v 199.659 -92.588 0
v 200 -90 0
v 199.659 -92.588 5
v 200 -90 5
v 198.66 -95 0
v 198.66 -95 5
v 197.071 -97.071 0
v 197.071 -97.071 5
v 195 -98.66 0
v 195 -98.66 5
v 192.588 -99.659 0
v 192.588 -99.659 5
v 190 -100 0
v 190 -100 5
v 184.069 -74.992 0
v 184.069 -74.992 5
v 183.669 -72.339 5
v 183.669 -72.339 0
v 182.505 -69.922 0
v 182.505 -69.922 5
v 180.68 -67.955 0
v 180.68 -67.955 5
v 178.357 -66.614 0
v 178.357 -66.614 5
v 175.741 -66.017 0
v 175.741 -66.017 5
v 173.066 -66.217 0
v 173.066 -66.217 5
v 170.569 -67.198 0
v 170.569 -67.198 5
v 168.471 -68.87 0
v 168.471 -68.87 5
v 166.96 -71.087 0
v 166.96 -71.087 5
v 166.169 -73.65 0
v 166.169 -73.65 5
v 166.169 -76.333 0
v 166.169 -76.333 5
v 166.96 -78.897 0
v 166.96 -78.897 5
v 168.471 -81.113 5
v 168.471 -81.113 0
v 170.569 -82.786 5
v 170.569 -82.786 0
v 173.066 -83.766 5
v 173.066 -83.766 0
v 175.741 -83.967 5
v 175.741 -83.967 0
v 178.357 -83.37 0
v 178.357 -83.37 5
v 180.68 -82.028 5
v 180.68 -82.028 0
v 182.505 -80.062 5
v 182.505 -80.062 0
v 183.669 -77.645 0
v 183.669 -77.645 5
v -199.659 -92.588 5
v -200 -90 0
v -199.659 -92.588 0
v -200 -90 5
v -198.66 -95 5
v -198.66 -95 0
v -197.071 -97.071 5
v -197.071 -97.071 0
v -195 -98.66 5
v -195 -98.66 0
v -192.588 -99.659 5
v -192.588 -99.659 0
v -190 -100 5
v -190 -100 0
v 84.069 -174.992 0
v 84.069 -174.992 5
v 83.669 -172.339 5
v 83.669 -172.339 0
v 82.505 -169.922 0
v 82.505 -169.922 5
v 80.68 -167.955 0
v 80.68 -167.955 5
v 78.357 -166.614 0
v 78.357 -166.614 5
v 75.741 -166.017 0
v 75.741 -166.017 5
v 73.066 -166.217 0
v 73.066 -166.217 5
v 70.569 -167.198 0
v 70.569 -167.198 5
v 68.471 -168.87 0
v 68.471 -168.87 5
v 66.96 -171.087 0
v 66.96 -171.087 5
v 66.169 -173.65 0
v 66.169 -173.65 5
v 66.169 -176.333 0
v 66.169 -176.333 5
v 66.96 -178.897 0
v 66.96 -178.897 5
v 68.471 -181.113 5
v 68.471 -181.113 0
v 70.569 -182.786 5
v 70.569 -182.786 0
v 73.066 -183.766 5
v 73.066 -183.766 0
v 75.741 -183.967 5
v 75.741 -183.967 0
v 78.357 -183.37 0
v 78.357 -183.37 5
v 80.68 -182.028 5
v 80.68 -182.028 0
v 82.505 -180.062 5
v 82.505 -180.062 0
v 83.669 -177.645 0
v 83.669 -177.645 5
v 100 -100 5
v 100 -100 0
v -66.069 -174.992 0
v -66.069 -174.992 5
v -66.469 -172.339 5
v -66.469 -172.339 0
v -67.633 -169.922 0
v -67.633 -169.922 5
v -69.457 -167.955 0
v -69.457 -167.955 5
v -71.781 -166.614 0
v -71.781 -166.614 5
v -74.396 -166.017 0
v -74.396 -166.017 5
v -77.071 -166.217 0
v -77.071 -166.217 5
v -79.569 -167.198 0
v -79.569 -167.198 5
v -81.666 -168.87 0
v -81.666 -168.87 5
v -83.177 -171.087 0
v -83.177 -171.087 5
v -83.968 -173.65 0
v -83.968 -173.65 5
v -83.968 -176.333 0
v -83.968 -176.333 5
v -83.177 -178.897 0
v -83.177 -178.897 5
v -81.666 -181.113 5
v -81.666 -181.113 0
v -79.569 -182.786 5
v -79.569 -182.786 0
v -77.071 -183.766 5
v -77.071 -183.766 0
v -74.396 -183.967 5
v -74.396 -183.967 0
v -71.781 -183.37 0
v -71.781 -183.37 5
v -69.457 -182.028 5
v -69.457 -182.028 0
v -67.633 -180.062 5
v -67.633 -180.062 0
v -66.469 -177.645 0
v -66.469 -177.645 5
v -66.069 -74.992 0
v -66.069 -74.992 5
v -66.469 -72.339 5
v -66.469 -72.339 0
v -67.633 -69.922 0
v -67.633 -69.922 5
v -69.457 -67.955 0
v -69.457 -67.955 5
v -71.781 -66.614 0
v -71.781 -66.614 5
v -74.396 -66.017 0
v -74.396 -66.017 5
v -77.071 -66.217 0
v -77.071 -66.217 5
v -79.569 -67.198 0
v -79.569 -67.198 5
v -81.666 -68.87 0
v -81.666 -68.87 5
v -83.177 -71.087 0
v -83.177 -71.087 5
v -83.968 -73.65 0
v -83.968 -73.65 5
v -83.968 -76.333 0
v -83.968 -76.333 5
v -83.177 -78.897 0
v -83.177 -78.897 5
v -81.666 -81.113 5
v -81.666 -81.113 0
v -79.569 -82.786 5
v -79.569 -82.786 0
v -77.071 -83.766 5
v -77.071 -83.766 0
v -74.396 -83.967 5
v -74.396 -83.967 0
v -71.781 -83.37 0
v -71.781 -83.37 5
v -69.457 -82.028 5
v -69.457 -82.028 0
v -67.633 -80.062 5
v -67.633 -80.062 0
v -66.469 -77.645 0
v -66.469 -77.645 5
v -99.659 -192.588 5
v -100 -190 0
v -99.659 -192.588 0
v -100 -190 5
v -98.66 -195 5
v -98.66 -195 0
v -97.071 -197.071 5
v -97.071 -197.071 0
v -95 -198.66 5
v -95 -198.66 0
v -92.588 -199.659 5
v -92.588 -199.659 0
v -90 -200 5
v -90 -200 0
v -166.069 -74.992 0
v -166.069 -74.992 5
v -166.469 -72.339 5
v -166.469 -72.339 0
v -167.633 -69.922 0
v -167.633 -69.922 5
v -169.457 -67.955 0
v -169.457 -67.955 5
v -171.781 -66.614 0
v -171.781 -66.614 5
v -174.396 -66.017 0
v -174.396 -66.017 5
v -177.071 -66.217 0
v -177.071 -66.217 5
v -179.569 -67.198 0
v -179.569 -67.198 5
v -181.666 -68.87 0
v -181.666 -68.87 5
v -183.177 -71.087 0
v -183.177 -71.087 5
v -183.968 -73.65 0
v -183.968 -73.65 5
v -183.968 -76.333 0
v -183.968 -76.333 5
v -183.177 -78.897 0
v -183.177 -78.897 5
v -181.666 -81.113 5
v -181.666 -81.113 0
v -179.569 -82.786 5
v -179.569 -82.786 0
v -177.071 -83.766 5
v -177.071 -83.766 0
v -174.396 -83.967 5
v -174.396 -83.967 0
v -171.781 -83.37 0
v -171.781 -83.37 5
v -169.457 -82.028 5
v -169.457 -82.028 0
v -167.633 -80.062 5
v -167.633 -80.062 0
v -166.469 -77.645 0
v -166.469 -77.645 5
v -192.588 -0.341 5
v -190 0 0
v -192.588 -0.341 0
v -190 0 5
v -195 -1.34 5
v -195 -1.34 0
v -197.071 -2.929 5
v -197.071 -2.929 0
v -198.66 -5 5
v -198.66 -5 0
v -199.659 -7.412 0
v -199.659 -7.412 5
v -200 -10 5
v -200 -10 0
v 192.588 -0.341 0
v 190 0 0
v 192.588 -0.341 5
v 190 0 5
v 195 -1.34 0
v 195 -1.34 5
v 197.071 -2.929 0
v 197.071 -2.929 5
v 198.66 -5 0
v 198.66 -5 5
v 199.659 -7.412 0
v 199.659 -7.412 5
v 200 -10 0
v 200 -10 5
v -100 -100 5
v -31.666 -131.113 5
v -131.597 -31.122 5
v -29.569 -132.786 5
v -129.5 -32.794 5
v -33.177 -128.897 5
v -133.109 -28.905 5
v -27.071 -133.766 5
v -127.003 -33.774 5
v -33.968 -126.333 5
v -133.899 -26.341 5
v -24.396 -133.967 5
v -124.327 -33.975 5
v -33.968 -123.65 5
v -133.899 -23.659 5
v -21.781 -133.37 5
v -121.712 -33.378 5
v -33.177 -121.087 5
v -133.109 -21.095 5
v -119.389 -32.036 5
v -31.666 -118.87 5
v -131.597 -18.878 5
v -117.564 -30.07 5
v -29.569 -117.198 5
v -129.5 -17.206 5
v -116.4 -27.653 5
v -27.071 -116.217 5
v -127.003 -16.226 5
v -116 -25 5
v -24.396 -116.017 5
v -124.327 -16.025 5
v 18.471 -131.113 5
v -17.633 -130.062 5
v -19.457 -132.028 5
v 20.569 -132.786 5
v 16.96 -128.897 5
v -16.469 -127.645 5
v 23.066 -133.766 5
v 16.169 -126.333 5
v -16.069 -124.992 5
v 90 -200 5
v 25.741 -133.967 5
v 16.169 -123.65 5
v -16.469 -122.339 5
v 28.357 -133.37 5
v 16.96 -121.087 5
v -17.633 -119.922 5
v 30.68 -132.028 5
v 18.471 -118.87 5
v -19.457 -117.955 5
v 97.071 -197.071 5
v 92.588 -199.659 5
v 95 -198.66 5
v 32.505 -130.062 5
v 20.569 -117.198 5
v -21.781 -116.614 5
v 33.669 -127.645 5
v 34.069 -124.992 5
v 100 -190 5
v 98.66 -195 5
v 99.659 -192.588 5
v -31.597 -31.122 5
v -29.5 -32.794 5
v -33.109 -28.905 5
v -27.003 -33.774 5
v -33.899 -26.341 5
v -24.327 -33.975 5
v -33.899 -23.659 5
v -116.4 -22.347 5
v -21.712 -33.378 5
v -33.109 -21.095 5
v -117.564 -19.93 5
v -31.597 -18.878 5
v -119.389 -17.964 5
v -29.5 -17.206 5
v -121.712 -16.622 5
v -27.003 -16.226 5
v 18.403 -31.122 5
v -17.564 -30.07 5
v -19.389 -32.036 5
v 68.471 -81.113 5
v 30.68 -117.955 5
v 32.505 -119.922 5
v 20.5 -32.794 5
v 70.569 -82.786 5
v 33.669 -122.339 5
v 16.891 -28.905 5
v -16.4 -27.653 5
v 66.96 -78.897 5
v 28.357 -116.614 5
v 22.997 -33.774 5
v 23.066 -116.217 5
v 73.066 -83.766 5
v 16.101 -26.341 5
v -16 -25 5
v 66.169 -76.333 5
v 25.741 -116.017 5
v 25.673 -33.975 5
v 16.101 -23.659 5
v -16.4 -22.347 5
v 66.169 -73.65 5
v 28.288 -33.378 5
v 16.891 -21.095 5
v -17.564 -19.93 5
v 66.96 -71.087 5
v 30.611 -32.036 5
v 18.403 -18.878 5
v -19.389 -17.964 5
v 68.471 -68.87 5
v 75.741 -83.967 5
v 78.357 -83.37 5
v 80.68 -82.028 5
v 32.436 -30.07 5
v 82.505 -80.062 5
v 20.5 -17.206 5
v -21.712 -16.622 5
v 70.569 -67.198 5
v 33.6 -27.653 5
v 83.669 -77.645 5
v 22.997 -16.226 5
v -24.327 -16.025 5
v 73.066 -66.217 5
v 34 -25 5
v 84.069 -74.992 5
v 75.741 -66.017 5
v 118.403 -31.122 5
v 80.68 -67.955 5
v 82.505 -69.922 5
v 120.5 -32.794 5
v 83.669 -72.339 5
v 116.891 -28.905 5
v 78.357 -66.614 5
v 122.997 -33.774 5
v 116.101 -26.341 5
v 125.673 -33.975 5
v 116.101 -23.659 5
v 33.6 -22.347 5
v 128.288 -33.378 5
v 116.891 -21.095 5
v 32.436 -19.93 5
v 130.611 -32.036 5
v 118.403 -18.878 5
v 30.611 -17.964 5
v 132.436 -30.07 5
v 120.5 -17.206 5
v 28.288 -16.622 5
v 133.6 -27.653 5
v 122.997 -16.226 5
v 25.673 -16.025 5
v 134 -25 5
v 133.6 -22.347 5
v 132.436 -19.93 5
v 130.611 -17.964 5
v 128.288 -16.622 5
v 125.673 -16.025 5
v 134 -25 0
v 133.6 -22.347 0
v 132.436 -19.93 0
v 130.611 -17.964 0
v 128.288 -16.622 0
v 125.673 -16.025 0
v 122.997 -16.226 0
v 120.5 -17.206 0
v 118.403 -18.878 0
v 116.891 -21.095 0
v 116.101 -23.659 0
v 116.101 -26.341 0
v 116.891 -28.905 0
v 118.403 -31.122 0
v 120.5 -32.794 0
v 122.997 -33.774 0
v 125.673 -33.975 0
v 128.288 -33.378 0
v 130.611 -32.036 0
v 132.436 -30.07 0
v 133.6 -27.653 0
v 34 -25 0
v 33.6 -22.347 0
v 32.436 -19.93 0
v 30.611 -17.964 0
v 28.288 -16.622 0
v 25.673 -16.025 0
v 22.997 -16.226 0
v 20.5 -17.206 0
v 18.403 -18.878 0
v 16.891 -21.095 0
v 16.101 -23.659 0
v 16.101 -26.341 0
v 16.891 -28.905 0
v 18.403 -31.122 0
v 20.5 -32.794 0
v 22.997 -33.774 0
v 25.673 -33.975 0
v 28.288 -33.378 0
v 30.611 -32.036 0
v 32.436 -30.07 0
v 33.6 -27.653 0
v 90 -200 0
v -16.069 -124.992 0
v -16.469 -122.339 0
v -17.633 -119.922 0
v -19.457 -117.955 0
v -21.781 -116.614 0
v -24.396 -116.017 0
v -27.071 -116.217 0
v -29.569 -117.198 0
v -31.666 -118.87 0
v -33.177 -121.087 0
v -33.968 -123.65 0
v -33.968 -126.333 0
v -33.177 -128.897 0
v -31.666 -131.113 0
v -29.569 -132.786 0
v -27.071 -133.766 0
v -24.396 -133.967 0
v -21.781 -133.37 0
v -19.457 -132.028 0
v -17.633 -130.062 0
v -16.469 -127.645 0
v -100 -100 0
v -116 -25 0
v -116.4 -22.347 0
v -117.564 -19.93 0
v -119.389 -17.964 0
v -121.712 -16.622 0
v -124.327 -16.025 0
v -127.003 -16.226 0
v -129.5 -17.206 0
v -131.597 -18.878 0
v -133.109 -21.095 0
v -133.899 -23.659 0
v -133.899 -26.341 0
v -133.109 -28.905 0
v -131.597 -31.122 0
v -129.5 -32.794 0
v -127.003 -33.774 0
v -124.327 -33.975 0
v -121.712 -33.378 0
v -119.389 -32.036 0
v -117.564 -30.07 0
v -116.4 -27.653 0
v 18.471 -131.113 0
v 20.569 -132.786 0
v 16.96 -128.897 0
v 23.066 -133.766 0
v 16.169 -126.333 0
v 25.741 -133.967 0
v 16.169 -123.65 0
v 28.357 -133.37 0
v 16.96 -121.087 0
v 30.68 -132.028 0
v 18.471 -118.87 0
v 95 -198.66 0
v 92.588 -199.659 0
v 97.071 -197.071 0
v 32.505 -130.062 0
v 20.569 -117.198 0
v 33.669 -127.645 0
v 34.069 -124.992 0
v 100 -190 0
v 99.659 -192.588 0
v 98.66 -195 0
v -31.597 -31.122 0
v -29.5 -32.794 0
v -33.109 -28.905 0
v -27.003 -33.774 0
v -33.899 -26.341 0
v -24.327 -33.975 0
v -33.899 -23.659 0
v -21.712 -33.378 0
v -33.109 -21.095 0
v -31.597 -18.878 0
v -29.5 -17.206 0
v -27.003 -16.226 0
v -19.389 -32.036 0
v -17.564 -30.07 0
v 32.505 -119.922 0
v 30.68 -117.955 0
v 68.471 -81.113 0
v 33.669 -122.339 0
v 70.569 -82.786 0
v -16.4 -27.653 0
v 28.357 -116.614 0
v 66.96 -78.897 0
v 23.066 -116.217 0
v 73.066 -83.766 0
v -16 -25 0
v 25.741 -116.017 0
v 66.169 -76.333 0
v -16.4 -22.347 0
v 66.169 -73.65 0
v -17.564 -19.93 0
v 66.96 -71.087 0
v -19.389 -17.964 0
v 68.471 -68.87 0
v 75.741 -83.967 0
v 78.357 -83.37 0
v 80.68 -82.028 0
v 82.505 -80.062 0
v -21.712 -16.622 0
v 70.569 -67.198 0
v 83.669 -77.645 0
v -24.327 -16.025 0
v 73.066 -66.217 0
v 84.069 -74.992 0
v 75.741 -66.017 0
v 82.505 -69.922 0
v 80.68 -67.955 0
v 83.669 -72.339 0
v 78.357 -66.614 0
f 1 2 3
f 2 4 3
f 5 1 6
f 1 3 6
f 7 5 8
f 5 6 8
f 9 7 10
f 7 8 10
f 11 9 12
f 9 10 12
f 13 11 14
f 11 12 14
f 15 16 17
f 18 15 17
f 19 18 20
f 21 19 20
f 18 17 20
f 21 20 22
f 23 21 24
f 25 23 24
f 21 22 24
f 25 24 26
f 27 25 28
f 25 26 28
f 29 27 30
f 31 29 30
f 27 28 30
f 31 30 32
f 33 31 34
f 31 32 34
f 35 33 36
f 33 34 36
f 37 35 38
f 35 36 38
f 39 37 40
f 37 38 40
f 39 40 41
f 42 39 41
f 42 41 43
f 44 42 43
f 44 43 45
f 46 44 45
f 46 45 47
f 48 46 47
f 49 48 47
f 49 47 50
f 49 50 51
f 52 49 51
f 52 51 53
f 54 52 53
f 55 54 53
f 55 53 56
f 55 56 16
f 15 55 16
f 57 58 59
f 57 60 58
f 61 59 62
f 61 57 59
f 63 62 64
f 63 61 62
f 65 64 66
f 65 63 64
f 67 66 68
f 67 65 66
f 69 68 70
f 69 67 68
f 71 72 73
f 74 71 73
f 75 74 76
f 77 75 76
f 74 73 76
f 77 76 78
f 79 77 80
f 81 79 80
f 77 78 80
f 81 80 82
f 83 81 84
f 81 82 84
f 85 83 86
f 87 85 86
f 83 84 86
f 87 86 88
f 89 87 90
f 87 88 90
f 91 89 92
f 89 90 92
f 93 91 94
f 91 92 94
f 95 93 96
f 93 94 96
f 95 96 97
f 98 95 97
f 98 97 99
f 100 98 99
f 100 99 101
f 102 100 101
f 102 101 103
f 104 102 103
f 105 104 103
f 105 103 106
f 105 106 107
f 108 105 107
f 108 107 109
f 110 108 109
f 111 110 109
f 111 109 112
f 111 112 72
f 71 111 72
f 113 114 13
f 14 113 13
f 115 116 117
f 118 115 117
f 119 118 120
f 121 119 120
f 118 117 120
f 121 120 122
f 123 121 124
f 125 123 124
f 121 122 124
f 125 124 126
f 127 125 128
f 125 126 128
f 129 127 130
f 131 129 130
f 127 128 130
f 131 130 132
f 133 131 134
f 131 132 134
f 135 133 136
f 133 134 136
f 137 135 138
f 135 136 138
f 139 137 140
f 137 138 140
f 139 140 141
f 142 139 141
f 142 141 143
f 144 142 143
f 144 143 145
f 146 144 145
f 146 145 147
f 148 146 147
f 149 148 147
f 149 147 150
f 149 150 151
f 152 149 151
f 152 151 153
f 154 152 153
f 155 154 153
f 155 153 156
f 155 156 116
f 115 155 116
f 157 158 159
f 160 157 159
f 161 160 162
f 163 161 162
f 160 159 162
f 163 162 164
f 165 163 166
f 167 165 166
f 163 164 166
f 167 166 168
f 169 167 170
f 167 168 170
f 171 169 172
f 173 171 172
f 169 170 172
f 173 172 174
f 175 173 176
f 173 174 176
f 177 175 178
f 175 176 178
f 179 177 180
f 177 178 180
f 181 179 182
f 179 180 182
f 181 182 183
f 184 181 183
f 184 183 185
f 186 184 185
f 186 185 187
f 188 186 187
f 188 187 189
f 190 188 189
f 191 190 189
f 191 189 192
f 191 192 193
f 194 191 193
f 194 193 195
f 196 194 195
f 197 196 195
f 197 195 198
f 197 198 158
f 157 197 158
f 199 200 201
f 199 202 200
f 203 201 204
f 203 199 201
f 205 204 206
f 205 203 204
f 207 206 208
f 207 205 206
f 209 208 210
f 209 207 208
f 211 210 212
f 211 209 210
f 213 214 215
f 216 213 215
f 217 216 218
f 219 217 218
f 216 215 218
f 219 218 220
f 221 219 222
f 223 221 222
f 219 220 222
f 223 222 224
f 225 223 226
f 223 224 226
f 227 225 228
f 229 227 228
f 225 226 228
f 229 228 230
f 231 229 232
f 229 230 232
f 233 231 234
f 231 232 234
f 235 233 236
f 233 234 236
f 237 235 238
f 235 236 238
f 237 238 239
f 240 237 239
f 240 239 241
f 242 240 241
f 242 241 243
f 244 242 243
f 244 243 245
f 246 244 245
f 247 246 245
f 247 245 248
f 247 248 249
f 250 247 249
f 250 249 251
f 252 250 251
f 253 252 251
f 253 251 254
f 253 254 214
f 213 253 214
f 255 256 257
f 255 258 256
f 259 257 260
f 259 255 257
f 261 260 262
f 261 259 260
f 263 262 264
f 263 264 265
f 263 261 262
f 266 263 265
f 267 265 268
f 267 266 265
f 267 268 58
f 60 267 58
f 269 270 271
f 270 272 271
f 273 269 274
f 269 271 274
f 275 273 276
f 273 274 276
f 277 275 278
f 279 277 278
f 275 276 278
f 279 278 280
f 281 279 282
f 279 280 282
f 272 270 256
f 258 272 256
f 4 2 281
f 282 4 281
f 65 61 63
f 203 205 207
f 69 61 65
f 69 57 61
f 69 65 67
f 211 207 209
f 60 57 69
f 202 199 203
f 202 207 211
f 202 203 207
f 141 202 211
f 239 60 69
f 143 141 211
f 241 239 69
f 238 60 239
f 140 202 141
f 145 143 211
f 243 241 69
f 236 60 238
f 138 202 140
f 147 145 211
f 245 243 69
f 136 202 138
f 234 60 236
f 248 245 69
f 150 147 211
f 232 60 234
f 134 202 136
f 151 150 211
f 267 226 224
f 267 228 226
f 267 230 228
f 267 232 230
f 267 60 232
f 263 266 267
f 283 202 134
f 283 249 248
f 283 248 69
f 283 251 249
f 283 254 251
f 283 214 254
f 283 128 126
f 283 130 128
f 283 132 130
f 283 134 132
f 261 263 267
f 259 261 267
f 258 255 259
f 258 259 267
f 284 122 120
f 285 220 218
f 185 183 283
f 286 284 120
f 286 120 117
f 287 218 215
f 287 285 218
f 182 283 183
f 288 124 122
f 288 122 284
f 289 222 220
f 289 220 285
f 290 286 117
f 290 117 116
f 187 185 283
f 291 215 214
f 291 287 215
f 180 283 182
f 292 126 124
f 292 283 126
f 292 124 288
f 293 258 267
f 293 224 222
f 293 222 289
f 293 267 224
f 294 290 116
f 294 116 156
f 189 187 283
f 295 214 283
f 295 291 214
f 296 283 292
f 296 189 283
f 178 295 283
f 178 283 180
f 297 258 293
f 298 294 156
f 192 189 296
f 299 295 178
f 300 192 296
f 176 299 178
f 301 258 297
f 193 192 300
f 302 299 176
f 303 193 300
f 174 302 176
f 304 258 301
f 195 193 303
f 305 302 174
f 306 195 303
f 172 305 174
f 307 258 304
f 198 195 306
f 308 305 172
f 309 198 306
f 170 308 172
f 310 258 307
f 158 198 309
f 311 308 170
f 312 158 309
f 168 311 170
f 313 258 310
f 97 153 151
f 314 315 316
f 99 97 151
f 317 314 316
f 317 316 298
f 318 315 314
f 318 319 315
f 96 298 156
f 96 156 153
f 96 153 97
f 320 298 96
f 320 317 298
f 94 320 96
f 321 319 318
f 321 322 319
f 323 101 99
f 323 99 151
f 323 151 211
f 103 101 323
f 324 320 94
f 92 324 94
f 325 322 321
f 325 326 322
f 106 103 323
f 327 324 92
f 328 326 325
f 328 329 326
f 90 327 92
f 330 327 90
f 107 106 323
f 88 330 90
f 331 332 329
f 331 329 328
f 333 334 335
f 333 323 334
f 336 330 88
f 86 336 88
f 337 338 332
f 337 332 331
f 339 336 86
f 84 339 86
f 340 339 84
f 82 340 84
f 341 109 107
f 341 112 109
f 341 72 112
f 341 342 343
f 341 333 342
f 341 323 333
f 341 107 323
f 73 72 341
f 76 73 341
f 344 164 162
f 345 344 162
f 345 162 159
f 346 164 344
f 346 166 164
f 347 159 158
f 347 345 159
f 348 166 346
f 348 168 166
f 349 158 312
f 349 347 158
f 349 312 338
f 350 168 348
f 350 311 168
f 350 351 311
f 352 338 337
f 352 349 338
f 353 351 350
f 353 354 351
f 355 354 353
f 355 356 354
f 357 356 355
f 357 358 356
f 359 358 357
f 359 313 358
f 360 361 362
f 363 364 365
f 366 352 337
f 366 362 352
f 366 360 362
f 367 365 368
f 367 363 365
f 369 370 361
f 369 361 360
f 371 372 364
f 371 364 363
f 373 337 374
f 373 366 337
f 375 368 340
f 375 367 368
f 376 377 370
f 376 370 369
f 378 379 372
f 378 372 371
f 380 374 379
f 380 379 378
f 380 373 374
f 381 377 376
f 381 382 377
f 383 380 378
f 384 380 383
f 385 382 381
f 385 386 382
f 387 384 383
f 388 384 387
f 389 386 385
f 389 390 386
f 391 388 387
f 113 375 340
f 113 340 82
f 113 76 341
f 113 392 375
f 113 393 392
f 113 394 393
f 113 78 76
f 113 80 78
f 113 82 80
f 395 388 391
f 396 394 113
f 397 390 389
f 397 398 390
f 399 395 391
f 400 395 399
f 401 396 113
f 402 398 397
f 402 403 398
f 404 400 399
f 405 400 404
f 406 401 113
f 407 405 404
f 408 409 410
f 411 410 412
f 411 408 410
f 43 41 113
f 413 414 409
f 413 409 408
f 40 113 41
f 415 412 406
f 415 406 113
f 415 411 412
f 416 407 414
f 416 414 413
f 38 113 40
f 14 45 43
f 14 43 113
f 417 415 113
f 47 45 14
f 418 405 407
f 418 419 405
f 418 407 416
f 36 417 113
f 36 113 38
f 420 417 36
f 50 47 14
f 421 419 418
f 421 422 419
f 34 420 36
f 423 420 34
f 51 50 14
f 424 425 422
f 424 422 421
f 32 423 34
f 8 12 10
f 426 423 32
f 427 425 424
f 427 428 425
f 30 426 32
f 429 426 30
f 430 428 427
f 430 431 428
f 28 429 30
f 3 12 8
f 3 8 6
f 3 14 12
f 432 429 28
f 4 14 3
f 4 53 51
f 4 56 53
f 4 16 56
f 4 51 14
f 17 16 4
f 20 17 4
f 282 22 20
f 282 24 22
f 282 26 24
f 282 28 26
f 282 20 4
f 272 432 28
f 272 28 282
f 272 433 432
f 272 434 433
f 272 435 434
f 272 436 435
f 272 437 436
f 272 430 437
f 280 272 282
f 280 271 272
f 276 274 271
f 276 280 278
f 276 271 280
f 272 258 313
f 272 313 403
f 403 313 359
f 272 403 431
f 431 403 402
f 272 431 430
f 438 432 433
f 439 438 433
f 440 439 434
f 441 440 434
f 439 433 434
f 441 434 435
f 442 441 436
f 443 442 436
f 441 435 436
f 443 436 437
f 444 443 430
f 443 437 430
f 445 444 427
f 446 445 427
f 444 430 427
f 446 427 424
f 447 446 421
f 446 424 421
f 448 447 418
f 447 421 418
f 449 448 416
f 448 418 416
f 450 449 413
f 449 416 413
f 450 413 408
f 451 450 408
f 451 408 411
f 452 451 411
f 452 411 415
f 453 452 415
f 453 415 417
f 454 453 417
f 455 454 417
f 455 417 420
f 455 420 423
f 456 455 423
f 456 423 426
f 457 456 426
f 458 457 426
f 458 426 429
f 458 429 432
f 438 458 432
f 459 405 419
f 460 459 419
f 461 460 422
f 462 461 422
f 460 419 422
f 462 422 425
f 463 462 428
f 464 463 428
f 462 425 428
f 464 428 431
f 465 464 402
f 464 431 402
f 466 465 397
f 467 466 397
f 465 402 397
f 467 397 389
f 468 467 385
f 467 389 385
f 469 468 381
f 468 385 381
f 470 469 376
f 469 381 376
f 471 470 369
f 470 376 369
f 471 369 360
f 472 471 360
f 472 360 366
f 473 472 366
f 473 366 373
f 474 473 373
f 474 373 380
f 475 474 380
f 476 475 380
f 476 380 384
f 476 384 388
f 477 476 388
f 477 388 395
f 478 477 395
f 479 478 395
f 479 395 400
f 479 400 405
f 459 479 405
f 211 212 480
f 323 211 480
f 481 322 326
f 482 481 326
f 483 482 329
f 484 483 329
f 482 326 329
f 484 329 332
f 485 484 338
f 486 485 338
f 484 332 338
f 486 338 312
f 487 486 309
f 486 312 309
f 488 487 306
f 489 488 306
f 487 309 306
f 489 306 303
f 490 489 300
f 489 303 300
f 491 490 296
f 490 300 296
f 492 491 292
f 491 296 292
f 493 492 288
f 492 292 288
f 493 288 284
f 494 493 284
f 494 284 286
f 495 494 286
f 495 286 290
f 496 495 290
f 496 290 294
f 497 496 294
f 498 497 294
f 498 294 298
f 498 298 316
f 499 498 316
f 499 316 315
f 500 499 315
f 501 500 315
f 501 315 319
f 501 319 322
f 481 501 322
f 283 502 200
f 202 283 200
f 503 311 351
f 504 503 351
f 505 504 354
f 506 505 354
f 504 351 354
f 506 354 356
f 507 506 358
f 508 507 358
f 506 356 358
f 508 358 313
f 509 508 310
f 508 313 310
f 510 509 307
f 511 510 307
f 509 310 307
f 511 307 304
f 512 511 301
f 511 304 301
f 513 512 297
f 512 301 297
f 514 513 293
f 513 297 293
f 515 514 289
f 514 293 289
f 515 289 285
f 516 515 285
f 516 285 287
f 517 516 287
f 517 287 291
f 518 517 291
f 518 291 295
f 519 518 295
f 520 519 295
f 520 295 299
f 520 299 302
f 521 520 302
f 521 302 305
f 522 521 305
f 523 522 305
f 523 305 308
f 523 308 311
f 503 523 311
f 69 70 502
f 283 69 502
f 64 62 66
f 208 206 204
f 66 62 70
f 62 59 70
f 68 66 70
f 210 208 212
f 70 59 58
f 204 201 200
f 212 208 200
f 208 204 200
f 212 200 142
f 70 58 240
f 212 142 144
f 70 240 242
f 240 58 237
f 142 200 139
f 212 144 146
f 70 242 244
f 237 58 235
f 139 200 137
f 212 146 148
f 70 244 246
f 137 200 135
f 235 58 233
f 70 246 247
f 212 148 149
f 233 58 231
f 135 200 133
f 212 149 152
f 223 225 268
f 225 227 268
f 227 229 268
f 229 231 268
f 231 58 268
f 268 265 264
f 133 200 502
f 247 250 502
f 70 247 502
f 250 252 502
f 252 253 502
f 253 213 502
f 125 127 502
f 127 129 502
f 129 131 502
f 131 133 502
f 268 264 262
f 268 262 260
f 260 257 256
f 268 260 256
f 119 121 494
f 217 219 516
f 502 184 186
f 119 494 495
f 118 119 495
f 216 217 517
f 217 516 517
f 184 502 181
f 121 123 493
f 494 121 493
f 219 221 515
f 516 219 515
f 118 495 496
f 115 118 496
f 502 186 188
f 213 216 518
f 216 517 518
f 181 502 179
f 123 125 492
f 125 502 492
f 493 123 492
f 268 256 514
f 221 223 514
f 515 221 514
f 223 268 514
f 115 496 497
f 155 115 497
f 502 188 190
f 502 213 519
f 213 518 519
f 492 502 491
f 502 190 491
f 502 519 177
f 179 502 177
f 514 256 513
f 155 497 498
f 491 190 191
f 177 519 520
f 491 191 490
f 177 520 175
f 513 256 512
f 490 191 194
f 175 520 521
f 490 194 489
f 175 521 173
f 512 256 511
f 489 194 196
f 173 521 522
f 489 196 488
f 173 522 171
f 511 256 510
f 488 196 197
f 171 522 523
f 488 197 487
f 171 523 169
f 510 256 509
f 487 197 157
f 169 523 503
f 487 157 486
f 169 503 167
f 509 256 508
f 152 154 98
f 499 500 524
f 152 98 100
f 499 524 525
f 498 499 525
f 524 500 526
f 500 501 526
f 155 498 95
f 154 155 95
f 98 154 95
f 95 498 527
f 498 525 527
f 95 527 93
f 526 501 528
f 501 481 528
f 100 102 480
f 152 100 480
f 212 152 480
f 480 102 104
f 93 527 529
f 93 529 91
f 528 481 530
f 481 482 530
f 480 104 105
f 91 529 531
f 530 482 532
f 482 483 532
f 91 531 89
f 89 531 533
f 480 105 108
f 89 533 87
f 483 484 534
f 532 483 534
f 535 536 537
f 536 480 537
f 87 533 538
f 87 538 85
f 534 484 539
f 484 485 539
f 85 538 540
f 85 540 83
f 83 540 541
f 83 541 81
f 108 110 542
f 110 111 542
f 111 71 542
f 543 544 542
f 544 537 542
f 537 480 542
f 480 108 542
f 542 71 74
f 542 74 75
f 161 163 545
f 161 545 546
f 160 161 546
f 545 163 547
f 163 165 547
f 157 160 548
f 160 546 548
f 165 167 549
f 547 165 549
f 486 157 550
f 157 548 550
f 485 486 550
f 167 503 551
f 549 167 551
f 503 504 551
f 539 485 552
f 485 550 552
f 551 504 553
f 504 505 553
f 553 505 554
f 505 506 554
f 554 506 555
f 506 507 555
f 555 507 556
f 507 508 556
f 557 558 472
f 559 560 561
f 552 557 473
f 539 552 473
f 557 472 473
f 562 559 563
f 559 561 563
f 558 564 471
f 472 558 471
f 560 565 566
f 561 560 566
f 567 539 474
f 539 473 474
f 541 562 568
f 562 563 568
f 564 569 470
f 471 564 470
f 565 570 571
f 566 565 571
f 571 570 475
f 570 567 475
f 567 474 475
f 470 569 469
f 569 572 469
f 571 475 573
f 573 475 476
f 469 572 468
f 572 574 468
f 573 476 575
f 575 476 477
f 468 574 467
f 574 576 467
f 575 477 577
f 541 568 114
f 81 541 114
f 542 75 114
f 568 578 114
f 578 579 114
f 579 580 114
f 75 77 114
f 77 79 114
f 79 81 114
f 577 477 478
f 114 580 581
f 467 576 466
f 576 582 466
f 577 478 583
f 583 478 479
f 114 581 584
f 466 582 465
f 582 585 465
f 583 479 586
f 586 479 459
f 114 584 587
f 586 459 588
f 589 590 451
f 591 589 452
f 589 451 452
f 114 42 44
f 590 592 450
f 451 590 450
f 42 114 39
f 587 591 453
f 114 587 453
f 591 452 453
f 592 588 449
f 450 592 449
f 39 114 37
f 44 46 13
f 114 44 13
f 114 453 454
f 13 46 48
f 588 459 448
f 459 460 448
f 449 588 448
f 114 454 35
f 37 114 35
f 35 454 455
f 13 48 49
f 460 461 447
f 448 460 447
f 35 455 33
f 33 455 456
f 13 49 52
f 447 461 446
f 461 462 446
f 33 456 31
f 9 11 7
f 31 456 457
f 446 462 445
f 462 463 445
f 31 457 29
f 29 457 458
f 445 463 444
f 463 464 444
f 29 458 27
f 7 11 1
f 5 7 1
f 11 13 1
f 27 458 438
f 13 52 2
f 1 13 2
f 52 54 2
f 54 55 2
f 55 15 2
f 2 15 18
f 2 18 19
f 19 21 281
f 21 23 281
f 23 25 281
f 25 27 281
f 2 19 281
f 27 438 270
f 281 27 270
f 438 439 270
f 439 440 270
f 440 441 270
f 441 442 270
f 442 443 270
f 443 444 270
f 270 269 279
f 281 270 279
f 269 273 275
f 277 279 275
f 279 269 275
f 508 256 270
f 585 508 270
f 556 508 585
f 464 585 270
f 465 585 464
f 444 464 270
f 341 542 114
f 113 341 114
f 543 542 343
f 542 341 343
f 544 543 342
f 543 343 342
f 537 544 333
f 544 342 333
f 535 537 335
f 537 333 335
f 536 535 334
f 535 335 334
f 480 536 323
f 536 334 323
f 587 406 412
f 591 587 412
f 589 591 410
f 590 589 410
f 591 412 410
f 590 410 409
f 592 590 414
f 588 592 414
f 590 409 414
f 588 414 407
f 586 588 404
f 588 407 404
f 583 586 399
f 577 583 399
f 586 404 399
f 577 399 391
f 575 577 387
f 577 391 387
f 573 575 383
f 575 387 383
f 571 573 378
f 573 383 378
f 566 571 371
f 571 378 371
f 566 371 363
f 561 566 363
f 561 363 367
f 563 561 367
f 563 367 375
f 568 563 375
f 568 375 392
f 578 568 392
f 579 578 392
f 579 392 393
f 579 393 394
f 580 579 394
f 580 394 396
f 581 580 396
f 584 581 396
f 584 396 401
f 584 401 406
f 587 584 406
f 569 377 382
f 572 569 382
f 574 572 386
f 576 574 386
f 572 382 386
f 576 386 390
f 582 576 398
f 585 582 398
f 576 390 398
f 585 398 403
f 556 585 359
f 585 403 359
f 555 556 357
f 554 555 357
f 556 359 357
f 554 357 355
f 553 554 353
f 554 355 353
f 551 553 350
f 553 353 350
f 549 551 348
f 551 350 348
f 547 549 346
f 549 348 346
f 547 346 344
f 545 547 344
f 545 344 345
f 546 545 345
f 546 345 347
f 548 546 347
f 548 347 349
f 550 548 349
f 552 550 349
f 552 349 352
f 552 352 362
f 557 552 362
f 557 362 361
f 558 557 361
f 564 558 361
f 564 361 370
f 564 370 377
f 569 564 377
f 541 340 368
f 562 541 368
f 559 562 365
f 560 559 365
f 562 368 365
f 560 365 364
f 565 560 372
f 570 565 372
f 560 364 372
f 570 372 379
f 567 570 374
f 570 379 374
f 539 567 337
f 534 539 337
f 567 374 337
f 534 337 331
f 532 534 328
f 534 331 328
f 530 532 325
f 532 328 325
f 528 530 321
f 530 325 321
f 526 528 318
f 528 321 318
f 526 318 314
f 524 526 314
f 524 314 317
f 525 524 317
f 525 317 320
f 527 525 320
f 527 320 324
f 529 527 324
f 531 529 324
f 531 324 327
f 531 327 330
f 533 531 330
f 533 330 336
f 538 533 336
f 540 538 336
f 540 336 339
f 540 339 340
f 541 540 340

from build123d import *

# Parameters (mm, degrees)
F1_DEPTH = 5
F2_R     = 9
F3_DEPTH = 25
F4_R     = 10


with BuildPart() as f1:
    # F0 (on Top) → F1 (new body)
    with BuildSketch(Plane.XY):
        Polygon((200, 0), (0, 0), (-200, 0), (-200, -100), (-100, -100), (-100, -200), (0, -200), (100, -200), (100, -100), (200, -100), align=None)
    extrude(amount=F1_DEPTH)

    # F2 (on face) → F3 (cut)
    with BuildSketch(Plane.XY.offset(5)):
        with Locations((175.068656, -74.99178)):
            Circle(F2_R)
        with Locations((125, -25)):
            Circle(F2_R)
        with Locations((75.068656, -74.99178)):
            Circle(F2_R)
        with Locations((75.068656, -174.99178)):
            Circle(F2_R)
        with Locations((25.068656, -124.99178)):
            Circle(F2_R)
        with Locations((25, -25)):
            Circle(F2_R)
        with Locations((-75.068656, -174.99178)):
            Circle(F2_R)
        with Locations((-25, -25)):
            Circle(F2_R)
        with Locations((-175.068656, -74.99178)):
            Circle(F2_R)
        with Locations((-125, -25)):
            Circle(F2_R)
        with Locations((-75.068656, -74.99178)):
            Circle(F2_R)
        with Locations((-25.068656, -124.99178)):
            Circle(F2_R)
    extrude(amount=-F3_DEPTH, mode=Mode.SUBTRACT)

    # F4
    f4_edges = [f1.edges().sort_by_distance(p)[0] for p in [
        (-100, -200, 2.5),
        (100, -200, 2.5),
        (200, -100, 2.5),
        (200, 0, 2.5),
        (-200, -100, 2.5),
        (-200, 0, 2.5),
    ]]
    fillet(f4_edges, radius=F4_R)


solid = f1.part
